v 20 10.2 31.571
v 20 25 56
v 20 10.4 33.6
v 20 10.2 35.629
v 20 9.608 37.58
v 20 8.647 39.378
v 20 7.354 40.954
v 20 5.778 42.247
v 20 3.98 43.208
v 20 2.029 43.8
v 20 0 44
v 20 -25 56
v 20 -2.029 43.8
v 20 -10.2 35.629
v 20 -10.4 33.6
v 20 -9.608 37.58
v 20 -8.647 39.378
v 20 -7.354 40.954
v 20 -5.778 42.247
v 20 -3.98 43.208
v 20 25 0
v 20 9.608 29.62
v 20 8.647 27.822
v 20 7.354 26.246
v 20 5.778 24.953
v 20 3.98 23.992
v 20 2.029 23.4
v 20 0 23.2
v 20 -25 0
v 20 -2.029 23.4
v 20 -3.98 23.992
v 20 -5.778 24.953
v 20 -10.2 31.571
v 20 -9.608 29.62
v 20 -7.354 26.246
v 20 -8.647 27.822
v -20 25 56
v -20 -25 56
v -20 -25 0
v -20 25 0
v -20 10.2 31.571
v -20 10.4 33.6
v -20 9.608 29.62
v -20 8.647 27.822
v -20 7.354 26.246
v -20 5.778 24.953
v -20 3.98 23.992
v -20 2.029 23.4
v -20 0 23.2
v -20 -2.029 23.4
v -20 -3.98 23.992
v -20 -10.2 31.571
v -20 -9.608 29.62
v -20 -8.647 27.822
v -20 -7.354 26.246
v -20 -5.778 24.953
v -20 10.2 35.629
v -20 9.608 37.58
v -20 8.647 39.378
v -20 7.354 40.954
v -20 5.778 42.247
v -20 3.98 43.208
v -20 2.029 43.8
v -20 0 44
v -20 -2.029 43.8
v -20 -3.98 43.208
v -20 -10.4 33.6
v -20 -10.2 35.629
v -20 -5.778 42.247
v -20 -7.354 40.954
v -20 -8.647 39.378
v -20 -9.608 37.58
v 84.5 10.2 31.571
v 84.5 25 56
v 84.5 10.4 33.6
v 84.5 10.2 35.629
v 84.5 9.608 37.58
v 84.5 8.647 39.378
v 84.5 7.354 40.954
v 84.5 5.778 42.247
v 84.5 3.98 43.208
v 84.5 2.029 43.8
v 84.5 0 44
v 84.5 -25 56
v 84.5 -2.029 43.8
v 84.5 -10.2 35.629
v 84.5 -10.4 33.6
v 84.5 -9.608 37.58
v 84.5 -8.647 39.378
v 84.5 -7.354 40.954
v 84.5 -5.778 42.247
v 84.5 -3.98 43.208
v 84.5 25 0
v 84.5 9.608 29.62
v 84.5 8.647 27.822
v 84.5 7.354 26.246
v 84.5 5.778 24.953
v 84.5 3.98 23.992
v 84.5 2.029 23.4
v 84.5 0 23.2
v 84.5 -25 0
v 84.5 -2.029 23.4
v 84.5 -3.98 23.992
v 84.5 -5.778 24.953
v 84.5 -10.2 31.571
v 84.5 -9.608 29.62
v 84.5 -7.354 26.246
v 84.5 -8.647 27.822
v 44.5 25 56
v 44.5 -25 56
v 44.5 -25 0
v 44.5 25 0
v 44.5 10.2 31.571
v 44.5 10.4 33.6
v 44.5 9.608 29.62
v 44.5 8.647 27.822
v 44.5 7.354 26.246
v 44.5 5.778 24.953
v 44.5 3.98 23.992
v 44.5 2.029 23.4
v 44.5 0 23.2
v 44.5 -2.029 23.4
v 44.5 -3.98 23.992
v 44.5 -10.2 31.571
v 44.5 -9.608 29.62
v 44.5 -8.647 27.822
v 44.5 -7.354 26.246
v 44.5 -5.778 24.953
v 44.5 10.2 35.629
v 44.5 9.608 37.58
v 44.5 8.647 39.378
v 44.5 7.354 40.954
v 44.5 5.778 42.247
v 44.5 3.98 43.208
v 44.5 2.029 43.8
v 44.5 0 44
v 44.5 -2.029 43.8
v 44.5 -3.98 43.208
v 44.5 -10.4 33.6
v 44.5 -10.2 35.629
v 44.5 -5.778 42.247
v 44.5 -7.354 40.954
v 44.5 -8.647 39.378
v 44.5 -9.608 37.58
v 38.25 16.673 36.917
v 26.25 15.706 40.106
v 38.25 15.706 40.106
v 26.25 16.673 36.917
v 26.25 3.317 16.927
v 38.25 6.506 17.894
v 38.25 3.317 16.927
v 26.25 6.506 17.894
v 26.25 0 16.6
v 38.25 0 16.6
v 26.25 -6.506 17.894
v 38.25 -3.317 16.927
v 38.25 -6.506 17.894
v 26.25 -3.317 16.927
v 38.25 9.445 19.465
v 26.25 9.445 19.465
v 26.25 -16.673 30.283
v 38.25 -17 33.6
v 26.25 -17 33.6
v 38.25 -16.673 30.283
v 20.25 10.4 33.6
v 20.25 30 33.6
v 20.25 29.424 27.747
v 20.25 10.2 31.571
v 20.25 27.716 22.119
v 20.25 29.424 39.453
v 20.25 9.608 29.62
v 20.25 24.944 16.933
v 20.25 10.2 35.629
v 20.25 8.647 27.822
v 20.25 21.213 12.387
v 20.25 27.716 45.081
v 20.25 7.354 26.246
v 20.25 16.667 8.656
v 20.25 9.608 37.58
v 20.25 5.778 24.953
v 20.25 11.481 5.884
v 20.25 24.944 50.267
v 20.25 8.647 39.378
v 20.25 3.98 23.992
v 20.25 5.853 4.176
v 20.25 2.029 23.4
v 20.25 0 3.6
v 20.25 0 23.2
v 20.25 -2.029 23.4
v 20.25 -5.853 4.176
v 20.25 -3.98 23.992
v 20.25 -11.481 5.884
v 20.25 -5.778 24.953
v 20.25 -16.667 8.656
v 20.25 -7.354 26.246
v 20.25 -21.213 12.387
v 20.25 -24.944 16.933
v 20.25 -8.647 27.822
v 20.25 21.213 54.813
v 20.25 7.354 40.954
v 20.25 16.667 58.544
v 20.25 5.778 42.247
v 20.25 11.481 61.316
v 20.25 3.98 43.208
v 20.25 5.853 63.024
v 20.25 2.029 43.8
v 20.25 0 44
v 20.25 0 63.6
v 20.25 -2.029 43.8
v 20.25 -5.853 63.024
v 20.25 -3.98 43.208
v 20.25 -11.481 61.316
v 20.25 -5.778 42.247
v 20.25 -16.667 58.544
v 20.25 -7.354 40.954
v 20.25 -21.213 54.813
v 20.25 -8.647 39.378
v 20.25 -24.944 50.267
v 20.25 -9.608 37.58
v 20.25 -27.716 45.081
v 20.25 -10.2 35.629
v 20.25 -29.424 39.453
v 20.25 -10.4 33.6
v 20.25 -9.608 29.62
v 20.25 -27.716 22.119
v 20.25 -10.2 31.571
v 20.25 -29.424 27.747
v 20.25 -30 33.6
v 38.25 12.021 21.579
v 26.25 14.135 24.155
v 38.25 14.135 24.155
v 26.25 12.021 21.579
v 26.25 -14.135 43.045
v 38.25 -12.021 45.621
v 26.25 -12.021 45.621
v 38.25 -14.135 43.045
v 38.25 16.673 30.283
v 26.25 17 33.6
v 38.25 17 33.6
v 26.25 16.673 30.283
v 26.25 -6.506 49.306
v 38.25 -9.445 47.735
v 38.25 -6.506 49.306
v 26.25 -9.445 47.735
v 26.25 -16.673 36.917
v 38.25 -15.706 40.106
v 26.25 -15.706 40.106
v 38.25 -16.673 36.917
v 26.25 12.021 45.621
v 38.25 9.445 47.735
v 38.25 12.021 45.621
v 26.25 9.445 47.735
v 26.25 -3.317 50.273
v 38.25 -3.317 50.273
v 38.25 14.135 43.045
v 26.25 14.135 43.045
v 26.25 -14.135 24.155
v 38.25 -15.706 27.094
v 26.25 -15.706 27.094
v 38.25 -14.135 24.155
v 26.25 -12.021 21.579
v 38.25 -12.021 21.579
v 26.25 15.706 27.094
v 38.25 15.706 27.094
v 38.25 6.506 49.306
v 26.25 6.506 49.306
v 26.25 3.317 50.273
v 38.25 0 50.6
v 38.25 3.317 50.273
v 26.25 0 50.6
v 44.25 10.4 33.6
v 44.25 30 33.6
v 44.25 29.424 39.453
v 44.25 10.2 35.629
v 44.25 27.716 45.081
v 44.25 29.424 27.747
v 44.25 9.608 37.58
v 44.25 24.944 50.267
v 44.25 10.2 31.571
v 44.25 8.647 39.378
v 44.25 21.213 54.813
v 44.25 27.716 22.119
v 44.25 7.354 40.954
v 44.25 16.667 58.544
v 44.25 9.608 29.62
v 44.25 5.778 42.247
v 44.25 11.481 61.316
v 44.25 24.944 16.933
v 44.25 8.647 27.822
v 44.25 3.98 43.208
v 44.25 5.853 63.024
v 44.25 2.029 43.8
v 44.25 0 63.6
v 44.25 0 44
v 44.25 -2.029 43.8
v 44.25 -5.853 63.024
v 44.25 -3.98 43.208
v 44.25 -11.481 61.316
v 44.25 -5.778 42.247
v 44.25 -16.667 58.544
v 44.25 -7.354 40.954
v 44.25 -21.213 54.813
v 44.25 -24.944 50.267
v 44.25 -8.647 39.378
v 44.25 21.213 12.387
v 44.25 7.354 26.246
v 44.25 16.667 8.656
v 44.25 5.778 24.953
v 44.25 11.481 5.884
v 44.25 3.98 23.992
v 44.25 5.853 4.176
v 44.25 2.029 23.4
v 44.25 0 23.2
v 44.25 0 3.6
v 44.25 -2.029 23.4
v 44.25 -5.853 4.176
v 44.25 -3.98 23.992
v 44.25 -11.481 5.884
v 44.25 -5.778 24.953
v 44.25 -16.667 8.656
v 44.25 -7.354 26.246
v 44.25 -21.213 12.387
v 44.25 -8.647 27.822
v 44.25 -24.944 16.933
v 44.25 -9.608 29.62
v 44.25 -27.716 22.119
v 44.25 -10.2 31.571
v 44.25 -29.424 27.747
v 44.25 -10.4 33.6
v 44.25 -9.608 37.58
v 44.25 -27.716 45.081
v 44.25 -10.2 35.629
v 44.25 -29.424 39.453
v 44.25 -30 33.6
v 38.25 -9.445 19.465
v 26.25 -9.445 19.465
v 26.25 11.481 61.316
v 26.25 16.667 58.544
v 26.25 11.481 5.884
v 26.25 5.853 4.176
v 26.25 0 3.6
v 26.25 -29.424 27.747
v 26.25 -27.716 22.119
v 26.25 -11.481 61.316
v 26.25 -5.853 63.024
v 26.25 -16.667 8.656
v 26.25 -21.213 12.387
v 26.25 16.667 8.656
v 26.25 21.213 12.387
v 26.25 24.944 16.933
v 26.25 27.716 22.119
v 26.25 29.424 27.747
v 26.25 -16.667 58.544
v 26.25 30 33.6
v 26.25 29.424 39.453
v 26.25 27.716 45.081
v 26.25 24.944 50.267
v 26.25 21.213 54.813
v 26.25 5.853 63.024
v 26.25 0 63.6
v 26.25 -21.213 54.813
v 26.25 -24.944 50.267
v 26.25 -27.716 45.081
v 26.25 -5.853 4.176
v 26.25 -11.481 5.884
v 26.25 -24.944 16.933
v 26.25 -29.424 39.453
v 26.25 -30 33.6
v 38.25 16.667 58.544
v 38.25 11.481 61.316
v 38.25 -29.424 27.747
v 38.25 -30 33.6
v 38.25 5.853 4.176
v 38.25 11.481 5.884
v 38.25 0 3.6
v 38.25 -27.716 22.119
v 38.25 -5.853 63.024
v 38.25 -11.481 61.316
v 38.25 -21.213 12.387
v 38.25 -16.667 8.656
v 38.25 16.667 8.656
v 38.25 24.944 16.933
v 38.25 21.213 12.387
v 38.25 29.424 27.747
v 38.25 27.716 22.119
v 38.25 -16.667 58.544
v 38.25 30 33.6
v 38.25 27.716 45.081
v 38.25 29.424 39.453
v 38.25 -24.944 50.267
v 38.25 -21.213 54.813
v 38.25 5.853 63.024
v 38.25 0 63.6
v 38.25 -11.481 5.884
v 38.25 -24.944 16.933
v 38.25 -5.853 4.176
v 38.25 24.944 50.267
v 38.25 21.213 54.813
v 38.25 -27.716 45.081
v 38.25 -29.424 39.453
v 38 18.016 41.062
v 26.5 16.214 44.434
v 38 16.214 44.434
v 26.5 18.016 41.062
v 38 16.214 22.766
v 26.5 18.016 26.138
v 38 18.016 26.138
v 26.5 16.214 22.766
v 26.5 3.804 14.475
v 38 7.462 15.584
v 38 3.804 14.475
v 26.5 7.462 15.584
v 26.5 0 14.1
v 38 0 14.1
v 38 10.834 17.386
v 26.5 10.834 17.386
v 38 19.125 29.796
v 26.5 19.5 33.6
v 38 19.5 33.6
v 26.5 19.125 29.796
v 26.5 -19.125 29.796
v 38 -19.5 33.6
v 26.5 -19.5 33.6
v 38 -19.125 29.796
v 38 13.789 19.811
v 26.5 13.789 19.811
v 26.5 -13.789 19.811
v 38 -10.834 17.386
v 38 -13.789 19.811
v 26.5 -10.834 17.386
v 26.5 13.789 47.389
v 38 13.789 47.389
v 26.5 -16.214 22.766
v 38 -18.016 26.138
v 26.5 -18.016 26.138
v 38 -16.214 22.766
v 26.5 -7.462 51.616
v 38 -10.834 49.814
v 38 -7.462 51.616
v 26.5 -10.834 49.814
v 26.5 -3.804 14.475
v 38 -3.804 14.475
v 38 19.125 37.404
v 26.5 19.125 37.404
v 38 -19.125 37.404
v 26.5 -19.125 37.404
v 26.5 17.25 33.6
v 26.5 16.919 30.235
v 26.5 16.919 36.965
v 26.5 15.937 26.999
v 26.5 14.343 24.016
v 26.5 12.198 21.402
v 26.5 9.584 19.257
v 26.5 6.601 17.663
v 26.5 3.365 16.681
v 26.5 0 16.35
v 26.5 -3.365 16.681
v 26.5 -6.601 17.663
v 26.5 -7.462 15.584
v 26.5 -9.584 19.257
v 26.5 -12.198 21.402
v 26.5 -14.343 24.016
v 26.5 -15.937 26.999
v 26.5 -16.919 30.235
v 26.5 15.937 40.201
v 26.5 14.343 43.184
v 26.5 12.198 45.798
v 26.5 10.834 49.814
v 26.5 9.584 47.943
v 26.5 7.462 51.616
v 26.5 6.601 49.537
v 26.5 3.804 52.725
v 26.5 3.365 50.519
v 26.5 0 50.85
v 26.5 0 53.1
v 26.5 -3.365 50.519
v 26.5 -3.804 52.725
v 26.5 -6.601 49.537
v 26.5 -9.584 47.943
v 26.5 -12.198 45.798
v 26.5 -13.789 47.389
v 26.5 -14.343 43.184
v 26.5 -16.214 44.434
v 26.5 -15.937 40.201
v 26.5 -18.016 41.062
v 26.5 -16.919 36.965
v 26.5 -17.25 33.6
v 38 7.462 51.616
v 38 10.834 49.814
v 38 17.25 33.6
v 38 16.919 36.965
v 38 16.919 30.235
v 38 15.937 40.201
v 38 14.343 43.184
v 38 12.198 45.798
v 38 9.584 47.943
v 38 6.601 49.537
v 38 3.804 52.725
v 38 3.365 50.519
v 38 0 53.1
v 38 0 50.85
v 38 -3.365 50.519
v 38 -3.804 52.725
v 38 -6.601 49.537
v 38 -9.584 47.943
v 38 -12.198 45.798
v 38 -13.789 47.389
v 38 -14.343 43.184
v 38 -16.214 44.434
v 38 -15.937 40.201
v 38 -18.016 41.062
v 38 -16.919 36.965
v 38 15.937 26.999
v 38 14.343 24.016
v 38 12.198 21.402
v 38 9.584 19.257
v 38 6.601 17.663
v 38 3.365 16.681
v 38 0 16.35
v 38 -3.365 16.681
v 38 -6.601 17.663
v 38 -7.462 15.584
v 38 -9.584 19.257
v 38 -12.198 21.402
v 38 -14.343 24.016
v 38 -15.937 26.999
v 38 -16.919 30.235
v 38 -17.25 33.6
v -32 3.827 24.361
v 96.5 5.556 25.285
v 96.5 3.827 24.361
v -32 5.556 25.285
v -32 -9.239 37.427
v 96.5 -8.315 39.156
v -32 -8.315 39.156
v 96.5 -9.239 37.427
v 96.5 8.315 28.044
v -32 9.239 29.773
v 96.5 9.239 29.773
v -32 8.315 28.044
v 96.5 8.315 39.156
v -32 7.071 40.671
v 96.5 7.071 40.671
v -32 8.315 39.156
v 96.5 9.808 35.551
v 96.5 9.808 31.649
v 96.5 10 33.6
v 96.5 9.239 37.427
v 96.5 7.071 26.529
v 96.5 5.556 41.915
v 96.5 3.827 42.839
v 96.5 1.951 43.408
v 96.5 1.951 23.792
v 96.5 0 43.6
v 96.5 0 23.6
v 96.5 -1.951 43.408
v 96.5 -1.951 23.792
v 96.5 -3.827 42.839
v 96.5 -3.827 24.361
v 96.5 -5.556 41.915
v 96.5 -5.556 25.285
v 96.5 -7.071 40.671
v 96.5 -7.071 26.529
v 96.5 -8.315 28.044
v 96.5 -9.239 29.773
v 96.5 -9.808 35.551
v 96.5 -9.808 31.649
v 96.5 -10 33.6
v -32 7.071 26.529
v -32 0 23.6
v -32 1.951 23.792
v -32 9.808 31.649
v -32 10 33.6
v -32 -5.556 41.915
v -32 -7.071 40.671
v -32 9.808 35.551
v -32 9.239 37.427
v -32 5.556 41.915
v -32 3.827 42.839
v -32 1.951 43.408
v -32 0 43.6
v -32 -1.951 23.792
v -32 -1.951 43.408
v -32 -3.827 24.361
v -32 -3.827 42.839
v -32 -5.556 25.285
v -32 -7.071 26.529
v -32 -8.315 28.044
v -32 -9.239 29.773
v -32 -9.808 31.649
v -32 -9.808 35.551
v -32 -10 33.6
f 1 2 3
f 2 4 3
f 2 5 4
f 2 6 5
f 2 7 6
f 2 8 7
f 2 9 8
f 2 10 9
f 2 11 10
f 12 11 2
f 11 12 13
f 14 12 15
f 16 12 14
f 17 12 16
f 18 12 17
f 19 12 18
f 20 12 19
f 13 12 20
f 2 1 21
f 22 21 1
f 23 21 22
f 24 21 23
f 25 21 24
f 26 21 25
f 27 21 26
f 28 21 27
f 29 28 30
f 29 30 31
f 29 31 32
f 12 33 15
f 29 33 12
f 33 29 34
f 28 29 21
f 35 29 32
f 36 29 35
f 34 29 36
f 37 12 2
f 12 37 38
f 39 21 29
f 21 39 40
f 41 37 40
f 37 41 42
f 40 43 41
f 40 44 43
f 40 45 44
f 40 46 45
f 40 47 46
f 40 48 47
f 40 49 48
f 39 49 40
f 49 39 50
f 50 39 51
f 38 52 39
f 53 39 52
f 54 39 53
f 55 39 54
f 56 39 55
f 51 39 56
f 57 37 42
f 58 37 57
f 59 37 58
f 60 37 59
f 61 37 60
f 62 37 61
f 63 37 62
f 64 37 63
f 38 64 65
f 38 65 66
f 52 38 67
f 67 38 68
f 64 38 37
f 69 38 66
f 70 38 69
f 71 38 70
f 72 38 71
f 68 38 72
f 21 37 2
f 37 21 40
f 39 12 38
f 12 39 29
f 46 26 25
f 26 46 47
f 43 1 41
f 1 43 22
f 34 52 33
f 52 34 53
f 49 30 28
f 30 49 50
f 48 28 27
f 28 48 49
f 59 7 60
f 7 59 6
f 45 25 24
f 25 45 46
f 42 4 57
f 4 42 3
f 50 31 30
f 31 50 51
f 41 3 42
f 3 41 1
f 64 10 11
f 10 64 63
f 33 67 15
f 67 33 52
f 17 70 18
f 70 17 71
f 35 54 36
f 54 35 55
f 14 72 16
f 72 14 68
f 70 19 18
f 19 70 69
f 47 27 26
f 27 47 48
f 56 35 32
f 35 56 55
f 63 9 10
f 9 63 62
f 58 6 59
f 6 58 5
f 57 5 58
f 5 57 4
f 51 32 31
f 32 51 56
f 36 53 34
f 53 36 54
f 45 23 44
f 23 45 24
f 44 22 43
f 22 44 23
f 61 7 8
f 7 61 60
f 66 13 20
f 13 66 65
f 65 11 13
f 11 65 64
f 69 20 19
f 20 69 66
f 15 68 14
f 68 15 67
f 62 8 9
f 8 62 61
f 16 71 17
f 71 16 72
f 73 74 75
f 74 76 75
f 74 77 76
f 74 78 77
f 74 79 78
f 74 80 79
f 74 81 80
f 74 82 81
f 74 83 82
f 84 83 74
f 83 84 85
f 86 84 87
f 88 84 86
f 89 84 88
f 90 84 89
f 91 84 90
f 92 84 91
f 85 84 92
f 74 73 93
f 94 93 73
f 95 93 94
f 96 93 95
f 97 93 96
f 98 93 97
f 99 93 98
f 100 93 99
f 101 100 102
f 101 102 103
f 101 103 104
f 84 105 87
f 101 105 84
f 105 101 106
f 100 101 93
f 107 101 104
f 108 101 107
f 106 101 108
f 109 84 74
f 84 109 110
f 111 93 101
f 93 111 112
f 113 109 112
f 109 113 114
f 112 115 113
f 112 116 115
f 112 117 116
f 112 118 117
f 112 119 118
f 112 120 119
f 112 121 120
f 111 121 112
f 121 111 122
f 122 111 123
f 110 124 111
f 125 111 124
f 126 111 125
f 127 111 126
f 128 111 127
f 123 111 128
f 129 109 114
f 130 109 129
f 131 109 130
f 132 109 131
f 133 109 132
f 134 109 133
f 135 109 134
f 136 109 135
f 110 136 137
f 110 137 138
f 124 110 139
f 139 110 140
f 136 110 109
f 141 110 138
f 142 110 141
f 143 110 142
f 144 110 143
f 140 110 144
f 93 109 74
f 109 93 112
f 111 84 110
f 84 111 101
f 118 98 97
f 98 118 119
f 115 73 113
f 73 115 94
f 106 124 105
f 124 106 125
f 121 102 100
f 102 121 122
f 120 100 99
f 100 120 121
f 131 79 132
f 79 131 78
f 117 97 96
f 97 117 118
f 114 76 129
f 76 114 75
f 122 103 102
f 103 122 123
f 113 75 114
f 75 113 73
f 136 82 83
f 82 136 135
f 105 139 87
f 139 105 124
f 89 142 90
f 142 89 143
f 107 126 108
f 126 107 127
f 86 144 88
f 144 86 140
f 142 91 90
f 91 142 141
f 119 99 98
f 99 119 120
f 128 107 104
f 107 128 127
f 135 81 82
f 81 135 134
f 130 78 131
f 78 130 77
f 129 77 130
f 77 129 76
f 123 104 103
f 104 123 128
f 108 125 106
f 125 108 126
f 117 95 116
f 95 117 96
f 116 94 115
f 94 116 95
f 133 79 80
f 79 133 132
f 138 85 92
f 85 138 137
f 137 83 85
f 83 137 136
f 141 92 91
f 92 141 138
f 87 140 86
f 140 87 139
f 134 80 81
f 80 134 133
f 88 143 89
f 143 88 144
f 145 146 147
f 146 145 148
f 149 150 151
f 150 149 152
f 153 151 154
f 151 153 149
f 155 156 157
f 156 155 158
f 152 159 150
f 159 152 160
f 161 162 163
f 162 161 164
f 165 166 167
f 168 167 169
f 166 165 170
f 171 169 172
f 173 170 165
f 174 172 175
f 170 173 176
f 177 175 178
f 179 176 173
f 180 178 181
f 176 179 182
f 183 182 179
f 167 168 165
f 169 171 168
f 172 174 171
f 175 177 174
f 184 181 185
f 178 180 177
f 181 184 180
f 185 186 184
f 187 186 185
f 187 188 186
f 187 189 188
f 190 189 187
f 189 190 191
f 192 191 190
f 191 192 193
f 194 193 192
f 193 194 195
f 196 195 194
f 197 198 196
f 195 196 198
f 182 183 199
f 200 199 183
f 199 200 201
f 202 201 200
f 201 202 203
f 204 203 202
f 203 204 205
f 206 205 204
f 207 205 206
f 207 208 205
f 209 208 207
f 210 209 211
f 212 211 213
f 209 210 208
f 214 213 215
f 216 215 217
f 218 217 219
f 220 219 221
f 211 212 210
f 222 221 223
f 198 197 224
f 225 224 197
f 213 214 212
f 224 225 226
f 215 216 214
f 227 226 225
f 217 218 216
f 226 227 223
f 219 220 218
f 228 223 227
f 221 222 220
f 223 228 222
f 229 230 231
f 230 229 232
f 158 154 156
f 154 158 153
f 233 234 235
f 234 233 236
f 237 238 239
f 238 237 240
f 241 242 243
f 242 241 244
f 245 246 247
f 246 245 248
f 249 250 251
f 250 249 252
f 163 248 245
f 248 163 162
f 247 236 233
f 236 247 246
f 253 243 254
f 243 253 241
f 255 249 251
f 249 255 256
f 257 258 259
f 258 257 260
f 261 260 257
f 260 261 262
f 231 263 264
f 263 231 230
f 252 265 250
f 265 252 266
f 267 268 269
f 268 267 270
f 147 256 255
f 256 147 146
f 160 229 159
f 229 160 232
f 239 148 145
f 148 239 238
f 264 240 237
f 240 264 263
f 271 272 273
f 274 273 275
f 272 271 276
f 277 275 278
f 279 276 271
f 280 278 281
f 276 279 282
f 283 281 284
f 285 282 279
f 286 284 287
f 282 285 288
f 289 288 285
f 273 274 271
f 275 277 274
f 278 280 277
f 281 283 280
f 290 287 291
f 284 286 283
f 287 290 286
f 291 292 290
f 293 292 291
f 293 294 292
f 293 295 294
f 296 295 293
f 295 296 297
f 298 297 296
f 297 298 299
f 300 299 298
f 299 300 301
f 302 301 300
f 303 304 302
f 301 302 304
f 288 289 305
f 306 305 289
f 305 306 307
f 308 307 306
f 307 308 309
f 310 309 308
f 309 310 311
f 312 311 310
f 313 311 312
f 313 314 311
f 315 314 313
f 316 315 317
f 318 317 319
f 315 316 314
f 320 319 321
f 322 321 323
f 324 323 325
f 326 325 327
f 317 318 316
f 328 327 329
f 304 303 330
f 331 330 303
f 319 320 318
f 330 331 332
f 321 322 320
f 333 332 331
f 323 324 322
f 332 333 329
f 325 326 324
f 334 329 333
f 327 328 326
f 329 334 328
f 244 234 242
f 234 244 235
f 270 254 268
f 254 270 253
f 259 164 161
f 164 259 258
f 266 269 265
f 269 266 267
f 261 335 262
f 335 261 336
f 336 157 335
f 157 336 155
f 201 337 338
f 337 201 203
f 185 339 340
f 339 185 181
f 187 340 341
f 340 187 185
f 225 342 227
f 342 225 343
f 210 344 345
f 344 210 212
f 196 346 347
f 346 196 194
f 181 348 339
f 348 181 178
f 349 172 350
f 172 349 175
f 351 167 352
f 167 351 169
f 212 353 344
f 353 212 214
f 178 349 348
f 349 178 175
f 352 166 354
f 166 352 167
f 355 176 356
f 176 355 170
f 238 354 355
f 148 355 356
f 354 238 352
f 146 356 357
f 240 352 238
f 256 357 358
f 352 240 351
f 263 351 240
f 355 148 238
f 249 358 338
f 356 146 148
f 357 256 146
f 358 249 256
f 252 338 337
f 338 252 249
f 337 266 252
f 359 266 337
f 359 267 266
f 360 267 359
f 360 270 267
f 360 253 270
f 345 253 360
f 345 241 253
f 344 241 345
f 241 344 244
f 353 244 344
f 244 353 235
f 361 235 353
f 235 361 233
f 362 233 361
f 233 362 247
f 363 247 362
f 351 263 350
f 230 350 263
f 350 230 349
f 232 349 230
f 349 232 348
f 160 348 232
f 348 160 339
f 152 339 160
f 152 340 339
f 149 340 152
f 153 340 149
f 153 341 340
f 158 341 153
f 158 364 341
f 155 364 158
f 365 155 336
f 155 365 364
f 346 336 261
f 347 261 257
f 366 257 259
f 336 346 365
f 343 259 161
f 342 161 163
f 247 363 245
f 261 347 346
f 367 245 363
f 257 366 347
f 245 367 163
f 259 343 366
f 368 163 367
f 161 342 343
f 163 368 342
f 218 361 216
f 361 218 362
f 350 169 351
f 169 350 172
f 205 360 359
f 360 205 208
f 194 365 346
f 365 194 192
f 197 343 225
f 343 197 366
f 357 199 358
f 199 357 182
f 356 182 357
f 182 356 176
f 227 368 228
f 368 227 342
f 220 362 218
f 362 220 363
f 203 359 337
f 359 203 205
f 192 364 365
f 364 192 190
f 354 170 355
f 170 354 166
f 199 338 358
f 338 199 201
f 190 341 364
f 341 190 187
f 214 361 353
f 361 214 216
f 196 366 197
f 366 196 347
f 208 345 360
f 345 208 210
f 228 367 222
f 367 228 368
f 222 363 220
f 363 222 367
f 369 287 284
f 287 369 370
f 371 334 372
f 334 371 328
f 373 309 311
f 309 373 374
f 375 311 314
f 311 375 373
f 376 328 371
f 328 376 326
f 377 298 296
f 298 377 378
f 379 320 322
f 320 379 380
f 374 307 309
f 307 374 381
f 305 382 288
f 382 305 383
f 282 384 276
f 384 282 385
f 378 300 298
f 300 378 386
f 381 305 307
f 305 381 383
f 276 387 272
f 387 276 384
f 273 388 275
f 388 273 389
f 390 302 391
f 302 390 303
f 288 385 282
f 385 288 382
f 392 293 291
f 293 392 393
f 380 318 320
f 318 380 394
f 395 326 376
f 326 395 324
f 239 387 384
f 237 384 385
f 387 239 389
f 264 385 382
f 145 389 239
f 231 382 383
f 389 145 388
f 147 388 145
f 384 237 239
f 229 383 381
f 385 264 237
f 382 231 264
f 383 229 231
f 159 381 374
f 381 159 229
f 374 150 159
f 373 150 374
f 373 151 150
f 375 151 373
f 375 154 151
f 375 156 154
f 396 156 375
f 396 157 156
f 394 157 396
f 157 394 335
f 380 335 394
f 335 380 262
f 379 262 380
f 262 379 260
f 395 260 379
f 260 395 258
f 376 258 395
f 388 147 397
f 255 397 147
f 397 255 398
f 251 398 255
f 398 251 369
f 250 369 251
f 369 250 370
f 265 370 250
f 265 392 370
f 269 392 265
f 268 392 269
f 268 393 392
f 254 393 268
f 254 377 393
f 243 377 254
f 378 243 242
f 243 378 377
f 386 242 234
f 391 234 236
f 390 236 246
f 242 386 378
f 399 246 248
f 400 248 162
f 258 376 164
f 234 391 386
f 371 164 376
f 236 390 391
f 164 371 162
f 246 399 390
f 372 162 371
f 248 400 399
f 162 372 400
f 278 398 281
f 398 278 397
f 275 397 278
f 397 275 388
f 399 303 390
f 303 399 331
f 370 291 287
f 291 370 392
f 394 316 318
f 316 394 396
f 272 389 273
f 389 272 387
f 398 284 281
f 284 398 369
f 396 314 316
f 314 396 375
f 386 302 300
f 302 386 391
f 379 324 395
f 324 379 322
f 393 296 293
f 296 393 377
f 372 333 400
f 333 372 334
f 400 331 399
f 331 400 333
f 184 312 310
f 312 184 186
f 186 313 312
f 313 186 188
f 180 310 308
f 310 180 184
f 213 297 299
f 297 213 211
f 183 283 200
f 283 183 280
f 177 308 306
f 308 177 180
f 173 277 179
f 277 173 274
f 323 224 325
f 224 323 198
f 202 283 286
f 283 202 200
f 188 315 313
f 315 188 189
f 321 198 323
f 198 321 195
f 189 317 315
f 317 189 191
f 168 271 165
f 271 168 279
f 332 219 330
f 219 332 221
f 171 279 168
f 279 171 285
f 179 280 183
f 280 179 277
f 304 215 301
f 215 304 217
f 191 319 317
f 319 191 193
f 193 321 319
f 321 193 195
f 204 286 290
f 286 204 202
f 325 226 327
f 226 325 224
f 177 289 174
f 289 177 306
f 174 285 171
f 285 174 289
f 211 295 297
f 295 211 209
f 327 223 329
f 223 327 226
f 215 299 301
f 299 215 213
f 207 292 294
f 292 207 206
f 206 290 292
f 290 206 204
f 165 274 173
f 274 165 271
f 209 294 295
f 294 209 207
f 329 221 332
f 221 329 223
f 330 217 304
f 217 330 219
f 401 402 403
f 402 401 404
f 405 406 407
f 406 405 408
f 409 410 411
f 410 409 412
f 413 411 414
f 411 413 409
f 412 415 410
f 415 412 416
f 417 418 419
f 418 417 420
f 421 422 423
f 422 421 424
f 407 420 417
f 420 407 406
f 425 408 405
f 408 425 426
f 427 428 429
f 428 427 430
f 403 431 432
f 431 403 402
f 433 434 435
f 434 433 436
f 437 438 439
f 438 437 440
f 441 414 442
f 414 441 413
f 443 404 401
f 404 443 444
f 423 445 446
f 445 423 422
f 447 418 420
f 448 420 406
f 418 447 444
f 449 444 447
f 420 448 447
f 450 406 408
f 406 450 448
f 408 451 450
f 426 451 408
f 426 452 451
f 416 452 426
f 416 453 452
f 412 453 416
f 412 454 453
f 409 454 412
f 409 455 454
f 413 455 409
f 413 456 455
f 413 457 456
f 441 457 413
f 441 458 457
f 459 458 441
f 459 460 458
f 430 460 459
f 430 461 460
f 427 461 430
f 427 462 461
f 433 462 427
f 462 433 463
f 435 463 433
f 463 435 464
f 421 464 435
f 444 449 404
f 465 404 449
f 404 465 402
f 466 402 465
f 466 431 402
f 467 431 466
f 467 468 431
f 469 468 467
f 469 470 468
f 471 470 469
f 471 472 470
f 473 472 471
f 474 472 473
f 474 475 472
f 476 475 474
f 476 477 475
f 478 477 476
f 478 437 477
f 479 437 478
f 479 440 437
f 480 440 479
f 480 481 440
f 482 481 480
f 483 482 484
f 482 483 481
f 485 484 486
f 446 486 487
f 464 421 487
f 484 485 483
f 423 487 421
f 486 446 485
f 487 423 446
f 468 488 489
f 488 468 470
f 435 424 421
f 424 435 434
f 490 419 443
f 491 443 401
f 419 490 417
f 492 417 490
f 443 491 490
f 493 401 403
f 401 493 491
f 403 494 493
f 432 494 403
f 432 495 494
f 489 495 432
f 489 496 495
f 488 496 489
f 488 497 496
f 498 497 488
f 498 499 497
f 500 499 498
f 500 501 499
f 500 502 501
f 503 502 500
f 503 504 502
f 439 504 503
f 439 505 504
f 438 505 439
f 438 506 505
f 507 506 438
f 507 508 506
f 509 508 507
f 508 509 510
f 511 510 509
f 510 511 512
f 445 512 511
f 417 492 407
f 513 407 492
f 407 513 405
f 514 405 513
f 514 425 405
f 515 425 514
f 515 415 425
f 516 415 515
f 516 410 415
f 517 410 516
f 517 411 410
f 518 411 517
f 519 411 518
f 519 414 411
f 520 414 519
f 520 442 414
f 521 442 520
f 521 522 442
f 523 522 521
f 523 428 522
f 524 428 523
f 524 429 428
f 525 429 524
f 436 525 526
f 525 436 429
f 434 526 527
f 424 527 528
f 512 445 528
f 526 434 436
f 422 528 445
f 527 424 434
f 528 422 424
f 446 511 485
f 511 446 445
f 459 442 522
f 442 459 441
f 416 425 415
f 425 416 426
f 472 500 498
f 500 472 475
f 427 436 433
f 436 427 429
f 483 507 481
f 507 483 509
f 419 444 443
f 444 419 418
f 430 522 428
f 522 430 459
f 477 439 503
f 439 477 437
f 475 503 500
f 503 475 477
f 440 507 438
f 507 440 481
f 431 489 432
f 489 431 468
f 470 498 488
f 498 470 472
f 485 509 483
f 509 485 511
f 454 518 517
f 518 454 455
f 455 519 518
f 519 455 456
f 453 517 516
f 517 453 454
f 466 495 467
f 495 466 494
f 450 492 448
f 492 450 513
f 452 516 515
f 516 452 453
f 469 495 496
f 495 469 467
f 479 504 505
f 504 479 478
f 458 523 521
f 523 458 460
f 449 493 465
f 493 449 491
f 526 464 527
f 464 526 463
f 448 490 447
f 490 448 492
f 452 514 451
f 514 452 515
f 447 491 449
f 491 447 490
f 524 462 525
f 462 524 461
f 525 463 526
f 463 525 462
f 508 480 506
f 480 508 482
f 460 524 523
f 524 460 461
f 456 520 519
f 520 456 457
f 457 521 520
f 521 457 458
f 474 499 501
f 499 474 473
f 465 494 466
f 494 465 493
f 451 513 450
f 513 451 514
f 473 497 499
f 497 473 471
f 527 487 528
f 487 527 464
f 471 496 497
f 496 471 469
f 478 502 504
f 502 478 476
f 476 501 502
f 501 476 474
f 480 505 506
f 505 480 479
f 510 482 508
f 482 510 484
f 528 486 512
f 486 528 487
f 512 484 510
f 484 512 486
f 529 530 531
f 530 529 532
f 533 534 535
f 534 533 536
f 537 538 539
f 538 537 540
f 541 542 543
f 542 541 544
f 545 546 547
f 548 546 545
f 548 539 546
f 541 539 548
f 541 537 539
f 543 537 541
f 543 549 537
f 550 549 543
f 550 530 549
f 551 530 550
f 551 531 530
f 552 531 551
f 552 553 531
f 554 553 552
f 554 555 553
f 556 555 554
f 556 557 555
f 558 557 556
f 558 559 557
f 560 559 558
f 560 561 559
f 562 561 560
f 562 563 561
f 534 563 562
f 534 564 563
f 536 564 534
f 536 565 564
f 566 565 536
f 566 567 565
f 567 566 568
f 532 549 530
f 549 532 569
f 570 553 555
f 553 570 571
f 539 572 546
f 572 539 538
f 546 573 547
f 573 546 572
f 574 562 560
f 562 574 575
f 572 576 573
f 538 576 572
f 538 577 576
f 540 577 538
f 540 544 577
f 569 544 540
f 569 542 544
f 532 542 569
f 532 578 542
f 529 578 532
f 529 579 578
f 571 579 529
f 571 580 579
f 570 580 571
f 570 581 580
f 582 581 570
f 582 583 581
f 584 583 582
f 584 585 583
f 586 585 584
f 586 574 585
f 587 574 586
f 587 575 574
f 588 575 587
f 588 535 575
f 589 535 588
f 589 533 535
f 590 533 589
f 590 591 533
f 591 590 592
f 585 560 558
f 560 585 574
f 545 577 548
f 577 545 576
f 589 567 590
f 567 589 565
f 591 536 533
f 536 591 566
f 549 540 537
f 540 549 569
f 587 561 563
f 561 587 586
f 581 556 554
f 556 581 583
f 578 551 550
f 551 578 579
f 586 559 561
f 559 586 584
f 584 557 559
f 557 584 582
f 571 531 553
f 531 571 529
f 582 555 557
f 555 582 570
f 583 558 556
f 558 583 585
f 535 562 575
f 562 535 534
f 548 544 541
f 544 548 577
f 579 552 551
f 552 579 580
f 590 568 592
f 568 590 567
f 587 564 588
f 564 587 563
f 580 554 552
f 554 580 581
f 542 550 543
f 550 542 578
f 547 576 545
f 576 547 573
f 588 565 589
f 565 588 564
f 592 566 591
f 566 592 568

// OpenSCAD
$fn = 32;

// ------------------------------------------------------------------------
// Pulley assembly: d60 pulley with a belt, shaft d20
// Every part is its own module, assembly() places them once.
// ------------------------------------------------------------------------

// --- part 1 ---
module support1() {
  difference() {
    translate([-20, -25, 0]) cube([40, 50, 56]);
    translate([0, 0, 33.6]) rotate([0, 90, 0]) cylinder(h = 42, d = 20.8, center = true);
  }
}

// --- part 2 ---
module support2() {
  difference() {
    translate([-20, -25, 0]) cube([40, 50, 56]);
    translate([0, 0, 33.6]) rotate([0, 90, 0]) cylinder(h = 42, d = 20.8, center = true);
  }
}

// --- part 3 ---
module shaft() {
  translate([0, 0, -64.25]) cylinder(h = 128.5, d = 20);
}

// --- part 4 ---
module pulley() {
  difference() {
    union() {
      cylinder(h = 24, d = 34);
      cylinder(h = 6, d = 60);
      translate([0, 0, 18]) cylinder(h = 6, d = 60);
    }
    translate([0, 0, -1]) cylinder(h = 26, d = 20.8);
  }
}

// --- part 5 ---
module belt() {
  difference() {
      translate([0, 0, 0]) cylinder(h = 11.5, d = 39);
      translate([0, 0, -1]) cylinder(h = 13.5, d = 34.5);
    }
}

// --- assembly ---
module assembly() {
  translate([0, 0, 0]) rotate([0, 0, 0]) support1();
  translate([64.5, 0, 0]) rotate([0, 0, 0]) support2();
  translate([32.25, 0, 33.6]) rotate([0, 90, 0]) shaft();
  translate([20.25, 0, 33.6]) rotate([0, 90, 0]) pulley();
  translate([26.5, 0, 33.6]) rotate([0, 90, 0]) belt();
}

assembly();
